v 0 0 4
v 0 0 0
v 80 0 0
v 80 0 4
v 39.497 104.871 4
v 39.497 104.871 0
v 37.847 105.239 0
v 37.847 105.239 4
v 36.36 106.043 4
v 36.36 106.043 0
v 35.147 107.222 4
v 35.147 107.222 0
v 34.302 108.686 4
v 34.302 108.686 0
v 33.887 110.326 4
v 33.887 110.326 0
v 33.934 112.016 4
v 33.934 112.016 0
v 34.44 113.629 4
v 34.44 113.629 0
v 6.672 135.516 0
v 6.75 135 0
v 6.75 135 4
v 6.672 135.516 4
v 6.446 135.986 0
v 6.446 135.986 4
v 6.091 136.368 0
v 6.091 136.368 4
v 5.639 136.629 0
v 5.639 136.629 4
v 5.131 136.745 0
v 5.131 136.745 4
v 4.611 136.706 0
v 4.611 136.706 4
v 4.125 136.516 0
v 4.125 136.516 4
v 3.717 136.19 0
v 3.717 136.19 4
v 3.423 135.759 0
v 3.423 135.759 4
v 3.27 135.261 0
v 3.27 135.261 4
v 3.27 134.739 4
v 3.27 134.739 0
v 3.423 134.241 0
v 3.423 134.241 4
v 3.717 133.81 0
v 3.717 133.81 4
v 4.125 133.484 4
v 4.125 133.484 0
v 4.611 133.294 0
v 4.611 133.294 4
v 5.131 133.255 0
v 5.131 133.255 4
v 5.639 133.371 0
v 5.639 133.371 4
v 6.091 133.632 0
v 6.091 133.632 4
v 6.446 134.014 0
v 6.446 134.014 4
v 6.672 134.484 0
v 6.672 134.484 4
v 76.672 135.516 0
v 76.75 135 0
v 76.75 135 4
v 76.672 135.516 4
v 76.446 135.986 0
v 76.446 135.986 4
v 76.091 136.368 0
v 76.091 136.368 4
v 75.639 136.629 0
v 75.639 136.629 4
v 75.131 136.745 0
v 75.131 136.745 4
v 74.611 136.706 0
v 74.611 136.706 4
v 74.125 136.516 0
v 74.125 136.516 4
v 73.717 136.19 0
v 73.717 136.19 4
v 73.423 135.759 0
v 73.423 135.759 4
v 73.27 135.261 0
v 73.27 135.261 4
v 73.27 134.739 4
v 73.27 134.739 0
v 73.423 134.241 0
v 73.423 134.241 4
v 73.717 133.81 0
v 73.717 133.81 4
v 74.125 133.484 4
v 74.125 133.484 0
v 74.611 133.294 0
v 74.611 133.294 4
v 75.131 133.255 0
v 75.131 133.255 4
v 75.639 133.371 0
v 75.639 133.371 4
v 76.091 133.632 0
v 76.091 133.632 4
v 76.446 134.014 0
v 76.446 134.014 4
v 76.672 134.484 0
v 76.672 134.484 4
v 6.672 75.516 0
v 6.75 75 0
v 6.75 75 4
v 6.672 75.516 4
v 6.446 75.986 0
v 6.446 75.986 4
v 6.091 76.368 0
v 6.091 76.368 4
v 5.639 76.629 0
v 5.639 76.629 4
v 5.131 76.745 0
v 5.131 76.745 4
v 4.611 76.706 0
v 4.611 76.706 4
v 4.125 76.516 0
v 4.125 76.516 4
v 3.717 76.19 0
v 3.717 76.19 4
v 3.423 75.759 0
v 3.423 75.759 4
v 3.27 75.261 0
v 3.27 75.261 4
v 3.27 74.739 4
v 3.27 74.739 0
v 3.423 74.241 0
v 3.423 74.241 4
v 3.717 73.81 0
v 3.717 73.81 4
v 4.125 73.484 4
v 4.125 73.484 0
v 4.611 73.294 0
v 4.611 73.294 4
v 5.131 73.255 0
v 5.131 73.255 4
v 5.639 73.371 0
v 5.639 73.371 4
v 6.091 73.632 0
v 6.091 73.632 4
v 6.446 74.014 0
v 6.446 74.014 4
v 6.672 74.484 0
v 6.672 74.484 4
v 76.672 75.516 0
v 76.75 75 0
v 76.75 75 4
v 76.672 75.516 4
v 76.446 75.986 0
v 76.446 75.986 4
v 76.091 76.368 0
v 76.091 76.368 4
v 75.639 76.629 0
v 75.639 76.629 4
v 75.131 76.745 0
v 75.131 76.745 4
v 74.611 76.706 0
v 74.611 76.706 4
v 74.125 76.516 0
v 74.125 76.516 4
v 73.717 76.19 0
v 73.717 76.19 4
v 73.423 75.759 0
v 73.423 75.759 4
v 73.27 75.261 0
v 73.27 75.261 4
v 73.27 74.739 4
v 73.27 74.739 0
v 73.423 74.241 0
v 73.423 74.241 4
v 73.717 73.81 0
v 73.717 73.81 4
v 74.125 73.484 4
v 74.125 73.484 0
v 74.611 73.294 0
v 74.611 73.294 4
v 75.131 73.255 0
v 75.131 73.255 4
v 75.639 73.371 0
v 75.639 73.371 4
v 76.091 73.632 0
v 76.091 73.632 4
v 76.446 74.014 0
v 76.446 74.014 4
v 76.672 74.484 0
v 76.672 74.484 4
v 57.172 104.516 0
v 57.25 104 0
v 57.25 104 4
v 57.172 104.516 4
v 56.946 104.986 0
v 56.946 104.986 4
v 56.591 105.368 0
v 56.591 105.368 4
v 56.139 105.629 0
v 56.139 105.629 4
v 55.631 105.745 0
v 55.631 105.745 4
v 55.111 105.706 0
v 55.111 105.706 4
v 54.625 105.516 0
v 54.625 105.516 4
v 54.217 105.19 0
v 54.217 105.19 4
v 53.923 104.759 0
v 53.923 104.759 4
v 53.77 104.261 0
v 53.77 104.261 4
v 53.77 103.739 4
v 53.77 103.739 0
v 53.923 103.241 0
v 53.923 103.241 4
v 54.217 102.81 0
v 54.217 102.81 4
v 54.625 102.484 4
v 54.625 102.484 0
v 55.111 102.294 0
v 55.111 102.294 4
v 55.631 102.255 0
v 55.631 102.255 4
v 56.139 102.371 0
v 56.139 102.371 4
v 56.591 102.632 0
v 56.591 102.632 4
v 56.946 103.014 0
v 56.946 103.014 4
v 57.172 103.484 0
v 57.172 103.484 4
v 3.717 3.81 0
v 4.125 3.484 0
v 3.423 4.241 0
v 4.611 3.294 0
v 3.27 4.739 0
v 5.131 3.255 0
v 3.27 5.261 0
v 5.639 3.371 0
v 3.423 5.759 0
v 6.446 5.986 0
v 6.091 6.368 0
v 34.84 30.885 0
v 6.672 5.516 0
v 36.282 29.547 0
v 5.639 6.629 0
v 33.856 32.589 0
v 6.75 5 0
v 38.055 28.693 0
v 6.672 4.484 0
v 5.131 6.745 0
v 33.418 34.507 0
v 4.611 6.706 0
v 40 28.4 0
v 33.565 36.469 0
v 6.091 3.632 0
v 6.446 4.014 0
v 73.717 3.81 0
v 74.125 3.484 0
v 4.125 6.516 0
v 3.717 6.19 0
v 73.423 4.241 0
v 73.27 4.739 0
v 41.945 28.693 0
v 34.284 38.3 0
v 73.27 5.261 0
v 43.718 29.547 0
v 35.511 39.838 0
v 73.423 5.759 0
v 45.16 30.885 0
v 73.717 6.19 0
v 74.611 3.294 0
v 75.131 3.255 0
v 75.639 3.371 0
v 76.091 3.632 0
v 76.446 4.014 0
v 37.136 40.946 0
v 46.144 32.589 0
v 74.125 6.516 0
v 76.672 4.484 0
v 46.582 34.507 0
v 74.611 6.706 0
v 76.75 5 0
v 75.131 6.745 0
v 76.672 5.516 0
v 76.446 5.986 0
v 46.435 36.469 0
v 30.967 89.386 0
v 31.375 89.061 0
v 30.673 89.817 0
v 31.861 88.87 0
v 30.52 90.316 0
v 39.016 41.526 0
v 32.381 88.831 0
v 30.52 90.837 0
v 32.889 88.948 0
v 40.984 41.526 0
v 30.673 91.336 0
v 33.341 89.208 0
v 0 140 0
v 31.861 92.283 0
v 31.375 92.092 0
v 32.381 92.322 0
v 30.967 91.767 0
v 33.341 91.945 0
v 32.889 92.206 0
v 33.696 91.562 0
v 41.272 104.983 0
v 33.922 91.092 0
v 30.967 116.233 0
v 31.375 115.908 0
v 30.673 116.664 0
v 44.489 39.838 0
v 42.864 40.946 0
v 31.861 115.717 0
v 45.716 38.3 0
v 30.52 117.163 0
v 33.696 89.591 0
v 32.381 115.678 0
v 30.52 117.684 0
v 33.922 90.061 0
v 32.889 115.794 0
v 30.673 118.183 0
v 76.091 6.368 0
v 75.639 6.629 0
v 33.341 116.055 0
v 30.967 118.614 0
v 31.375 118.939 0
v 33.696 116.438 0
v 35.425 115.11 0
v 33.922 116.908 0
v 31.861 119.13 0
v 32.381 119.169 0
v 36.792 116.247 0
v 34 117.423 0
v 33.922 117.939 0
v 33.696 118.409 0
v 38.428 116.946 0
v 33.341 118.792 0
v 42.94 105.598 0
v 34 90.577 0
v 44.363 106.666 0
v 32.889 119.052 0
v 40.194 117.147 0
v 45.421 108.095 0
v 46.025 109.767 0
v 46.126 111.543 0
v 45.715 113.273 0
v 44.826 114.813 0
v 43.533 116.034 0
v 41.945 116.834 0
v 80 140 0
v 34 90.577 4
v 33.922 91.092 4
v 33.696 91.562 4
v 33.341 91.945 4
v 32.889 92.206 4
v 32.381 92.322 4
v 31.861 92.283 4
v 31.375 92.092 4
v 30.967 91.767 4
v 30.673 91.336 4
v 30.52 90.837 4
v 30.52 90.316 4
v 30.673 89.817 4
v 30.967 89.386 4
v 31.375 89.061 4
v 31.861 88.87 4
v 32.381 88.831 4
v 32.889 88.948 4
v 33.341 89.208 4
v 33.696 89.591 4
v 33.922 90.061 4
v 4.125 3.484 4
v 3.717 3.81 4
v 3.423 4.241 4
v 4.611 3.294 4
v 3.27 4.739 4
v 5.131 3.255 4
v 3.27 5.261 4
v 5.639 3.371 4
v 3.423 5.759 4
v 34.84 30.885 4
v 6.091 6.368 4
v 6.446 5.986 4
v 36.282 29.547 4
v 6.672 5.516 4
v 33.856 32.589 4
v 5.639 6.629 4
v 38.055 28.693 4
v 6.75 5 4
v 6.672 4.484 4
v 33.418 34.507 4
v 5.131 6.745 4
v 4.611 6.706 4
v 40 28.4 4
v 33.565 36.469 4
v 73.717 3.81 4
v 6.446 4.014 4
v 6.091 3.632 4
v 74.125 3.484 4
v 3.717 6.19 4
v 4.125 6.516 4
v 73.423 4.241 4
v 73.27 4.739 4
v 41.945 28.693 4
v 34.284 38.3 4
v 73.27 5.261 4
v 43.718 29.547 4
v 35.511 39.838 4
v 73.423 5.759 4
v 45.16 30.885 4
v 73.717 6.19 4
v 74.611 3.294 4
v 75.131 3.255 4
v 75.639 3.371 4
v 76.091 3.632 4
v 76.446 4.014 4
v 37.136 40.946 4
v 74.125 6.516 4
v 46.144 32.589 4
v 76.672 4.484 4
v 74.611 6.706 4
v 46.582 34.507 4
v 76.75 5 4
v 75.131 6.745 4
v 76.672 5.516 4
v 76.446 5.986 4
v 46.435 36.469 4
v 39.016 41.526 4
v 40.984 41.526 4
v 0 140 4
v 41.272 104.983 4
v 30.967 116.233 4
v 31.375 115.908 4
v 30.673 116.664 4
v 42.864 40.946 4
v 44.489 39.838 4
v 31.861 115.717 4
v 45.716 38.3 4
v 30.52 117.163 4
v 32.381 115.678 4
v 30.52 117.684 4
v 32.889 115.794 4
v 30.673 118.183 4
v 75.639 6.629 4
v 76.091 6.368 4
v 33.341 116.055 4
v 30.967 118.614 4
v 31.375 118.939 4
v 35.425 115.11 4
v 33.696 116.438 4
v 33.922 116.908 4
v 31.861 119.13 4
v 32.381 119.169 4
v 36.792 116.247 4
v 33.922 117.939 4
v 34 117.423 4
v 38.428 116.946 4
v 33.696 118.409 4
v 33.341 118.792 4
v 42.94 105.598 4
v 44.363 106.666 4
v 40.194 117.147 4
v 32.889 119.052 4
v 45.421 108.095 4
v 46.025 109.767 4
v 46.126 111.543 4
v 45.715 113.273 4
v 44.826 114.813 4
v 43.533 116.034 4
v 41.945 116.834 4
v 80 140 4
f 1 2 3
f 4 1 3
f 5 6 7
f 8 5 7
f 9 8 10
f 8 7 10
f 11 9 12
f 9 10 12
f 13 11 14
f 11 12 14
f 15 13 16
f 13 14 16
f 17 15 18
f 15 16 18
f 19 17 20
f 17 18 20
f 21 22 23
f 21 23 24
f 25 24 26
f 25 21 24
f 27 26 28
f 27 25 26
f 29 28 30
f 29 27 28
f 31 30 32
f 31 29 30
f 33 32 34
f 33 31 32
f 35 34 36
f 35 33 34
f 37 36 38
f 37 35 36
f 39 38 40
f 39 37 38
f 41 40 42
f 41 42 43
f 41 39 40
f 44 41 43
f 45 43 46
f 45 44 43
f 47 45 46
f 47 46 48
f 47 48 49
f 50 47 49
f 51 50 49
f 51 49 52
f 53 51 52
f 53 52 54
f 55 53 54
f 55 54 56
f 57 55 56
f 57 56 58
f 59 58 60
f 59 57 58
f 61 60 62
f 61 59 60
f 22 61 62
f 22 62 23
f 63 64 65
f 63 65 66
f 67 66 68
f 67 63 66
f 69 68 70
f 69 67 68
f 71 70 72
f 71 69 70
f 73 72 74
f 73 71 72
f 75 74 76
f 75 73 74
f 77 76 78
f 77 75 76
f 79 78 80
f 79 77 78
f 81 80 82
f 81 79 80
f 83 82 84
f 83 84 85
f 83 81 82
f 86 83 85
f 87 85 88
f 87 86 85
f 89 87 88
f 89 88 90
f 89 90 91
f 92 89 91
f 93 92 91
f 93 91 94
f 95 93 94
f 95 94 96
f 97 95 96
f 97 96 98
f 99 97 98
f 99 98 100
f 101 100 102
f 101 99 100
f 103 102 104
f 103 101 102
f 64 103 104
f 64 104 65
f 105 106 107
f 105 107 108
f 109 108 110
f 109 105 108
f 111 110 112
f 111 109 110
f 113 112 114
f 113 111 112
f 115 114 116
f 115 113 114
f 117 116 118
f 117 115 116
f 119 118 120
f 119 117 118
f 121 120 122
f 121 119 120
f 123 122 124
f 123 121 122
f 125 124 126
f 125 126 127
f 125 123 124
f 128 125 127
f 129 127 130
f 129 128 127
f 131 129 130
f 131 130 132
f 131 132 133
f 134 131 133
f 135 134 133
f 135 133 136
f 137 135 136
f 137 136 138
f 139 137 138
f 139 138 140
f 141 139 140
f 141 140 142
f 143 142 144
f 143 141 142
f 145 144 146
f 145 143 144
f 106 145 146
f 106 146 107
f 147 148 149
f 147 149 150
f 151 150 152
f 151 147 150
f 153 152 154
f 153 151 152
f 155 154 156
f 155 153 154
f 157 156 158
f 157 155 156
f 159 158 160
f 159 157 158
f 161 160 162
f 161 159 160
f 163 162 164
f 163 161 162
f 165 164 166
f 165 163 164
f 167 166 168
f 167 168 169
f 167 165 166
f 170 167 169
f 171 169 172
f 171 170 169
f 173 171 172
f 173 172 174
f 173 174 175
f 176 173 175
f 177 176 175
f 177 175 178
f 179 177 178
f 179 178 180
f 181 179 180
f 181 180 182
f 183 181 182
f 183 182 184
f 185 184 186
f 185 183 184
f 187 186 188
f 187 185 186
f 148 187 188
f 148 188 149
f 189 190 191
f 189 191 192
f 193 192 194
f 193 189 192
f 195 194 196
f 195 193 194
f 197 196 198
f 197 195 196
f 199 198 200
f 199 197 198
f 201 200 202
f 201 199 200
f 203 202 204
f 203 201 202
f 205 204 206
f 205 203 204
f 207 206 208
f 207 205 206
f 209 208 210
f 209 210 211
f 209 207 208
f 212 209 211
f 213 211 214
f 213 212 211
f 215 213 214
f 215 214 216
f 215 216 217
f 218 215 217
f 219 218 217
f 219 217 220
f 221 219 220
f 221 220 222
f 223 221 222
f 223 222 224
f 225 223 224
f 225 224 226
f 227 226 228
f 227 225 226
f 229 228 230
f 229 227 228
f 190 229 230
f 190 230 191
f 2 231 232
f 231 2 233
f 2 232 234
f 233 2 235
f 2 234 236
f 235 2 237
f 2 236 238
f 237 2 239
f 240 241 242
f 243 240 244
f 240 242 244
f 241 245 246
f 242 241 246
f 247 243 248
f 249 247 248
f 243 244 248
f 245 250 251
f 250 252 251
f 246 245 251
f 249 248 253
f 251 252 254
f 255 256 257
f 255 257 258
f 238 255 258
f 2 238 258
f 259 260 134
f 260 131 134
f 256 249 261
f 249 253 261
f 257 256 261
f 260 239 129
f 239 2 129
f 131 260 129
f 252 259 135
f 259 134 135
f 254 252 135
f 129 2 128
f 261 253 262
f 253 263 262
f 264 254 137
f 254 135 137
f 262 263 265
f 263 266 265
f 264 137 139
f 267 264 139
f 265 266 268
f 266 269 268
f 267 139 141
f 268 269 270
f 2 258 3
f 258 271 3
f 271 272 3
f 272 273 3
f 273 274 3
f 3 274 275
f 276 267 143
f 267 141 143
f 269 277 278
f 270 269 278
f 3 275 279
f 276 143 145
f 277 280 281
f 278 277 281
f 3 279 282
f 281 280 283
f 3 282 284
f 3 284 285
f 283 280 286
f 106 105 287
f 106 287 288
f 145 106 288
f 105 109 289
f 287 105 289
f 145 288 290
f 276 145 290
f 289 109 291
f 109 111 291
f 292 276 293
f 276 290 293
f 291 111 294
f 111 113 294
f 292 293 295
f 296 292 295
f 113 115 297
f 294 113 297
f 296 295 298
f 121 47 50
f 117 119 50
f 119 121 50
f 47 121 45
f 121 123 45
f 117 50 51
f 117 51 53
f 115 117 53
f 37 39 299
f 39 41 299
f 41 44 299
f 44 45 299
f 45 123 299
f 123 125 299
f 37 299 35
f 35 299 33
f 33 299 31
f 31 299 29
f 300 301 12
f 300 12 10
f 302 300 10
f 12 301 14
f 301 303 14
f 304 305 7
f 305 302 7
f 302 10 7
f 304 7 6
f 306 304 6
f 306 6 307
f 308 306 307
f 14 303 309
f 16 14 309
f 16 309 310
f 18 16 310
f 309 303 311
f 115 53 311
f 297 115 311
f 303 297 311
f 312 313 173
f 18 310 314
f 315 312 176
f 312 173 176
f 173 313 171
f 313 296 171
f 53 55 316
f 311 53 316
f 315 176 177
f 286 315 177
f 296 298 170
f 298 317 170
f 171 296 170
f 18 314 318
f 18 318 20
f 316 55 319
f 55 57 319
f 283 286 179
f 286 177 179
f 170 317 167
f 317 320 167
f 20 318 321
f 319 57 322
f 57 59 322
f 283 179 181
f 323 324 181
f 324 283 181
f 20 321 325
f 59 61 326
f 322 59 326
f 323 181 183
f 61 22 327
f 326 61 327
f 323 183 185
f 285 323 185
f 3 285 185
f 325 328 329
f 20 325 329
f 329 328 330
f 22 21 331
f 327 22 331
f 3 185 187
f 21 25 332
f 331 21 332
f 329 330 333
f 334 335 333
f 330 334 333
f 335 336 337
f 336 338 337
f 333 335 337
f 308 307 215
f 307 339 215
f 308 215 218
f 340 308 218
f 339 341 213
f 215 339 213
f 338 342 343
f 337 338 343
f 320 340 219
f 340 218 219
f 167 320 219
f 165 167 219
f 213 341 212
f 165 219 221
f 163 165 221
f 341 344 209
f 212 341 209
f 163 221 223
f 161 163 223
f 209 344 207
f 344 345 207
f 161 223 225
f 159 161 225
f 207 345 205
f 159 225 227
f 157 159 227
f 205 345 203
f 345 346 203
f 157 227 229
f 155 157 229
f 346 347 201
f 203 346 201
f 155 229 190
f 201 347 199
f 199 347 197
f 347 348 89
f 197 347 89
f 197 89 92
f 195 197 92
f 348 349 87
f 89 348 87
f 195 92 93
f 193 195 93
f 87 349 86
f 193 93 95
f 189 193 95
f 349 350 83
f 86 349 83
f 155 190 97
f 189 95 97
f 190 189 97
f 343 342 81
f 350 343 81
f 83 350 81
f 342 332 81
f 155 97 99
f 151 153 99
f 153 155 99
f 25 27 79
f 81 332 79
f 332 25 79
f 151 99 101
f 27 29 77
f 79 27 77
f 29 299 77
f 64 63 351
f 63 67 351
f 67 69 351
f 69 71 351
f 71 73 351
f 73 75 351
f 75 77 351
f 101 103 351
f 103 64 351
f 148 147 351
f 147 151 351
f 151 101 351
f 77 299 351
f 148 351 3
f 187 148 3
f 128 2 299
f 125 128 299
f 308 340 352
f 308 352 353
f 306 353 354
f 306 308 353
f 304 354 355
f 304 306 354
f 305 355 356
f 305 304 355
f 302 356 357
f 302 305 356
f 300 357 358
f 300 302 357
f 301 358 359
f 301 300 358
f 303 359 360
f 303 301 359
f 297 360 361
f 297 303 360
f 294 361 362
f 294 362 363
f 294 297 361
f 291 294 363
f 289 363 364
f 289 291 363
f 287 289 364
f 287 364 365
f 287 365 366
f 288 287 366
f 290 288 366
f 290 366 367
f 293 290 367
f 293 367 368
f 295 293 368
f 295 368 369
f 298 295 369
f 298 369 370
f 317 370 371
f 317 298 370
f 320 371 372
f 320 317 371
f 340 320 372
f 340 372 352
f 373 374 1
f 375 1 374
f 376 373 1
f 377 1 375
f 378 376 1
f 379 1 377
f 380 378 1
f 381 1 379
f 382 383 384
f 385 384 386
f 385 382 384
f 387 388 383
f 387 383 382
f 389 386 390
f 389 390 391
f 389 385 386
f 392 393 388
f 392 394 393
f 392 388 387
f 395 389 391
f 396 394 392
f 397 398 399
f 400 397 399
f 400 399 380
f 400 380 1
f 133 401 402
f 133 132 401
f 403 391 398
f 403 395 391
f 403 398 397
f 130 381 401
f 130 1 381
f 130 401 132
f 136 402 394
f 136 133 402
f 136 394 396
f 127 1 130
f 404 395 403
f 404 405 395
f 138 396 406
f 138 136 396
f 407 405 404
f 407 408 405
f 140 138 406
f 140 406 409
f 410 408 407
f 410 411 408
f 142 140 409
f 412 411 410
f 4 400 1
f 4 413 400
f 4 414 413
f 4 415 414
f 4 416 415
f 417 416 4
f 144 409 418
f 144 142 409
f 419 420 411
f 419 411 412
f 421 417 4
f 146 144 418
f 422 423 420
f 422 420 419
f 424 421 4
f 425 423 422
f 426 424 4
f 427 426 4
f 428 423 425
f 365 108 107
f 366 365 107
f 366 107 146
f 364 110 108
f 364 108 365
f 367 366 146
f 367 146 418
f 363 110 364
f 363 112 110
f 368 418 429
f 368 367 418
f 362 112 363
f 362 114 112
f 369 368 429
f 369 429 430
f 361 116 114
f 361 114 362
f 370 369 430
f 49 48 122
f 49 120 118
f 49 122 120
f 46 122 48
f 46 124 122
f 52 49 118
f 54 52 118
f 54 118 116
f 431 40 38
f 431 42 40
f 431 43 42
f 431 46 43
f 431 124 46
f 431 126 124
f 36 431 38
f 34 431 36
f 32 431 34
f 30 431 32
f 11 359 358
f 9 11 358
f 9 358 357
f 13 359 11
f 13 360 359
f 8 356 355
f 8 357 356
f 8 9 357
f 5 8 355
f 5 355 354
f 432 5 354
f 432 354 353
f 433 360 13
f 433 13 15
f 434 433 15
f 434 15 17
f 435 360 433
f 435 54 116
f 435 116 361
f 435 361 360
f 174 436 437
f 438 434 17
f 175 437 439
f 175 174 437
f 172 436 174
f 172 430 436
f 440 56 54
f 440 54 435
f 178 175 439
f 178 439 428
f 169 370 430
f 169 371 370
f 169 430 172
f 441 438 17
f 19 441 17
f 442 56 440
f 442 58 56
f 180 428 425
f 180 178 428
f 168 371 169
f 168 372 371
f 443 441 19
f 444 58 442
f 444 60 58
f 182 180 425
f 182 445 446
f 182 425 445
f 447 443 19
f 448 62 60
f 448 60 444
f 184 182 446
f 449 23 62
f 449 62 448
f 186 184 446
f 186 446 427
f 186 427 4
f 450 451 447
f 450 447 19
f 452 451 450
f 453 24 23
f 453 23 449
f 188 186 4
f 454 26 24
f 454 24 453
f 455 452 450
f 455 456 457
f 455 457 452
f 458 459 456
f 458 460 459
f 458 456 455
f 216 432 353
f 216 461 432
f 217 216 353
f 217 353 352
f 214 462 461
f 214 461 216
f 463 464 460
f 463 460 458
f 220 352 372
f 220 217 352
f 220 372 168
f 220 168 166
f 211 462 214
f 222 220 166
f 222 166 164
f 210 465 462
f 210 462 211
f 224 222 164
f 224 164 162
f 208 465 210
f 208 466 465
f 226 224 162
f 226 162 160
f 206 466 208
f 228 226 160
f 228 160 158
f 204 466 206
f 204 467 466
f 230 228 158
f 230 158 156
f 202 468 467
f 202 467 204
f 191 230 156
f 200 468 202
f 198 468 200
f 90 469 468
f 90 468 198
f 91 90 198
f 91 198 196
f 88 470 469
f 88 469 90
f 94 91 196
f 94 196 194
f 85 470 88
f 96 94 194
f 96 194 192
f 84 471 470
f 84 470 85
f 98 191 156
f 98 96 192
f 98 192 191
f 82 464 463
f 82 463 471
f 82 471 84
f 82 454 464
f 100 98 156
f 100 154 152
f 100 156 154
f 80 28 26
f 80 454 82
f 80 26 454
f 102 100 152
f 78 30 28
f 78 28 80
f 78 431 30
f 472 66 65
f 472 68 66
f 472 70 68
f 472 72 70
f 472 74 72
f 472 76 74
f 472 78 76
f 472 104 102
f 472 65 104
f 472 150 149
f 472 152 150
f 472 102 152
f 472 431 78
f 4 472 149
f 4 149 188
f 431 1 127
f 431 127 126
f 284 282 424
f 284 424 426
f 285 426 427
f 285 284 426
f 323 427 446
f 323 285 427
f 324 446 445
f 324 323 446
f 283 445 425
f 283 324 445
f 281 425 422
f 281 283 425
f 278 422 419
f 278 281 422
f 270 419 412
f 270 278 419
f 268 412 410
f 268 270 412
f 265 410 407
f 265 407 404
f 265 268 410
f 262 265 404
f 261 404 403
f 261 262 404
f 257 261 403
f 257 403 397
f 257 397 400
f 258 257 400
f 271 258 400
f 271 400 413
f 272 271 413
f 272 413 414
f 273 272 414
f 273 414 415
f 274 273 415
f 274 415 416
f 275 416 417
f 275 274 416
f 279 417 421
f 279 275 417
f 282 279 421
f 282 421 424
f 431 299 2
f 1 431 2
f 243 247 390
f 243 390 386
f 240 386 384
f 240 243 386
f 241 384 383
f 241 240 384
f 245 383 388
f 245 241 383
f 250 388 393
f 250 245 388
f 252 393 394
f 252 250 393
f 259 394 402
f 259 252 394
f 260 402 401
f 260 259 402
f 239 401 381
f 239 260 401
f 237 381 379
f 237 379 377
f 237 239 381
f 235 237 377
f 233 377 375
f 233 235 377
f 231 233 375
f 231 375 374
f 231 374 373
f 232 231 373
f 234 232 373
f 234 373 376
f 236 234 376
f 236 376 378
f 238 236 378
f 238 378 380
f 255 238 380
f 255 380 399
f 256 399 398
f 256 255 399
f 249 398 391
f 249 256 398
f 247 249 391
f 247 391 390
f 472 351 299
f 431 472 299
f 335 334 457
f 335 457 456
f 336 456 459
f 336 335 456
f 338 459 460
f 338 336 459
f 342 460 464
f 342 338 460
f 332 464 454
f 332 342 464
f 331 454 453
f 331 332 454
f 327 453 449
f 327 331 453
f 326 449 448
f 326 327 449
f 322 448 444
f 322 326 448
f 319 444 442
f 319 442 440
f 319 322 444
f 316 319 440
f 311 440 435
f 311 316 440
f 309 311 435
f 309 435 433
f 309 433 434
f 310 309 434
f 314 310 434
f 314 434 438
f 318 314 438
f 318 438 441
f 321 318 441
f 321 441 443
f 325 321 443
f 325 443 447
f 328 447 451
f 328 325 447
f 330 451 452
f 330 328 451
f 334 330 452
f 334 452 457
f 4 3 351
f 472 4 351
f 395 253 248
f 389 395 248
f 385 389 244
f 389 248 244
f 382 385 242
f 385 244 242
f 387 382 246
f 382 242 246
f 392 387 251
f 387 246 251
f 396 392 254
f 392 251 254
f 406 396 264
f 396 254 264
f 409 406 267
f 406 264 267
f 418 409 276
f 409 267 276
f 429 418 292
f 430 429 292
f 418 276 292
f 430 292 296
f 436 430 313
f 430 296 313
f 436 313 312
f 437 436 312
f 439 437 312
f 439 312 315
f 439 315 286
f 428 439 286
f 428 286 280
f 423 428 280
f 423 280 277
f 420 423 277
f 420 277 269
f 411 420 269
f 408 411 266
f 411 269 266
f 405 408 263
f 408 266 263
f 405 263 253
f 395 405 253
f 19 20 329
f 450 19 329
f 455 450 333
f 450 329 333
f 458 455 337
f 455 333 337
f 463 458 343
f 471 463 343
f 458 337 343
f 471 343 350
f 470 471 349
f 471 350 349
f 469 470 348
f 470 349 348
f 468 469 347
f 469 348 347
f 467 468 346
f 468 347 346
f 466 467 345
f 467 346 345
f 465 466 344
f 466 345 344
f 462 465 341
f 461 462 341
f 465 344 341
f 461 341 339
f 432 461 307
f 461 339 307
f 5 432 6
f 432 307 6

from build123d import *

# Parameters (mm, degrees)
SKETCH_1_R      = 1.75
EXTRUDE_1_DEPTH = 4


with BuildPart() as part:
    # ｽｹｯﾁ1 → ﾎﾞｽ - 押し出し1 (new body)
    with BuildSketch(Plane.XY):
        Polygon((0, 0), (40, 0), (80, 0), (80, 140), (0, 140), align=None)
        with Locations((5, 135)):
            Circle(SKETCH_1_R, mode=Mode.SUBTRACT)
        with Locations((5, 5)):
            Circle(SKETCH_1_R, mode=Mode.SUBTRACT)
        with BuildLine():
            ThreePointArc((40, 41.6), (46.6, 35), (40, 28.4))
            ThreePointArc((40, 28.4), (33.4, 35), (40, 41.6))
        make_face(mode=Mode.SUBTRACT)
        with Locations((75, 5)):
            Circle(SKETCH_1_R, mode=Mode.SUBTRACT)
        with Locations((5, 75)):
            Circle(SKETCH_1_R, mode=Mode.SUBTRACT)
        with Locations((32.25, 90.576606241)):
            Circle(SKETCH_1_R, mode=Mode.SUBTRACT)
        with Locations((32.25, 117.423393759)):
            Circle(SKETCH_1_R, mode=Mode.SUBTRACT)
        with Locations((75, 75)):
            Circle(SKETCH_1_R, mode=Mode.SUBTRACT)
        with BuildLine():
            ThreePointArc((34.440448115, 113.629426332), (45.326056233, 114.075), (39.497374059, 104.870573668))
            ThreePointArc((39.497374059, 104.870573668), (34.673943767, 107.925), (34.440448115, 113.629426332))
        make_face(mode=Mode.SUBTRACT)
        with Locations((55.5, 104)):
            Circle(SKETCH_1_R, mode=Mode.SUBTRACT)
        with Locations((75, 135)):
            Circle(SKETCH_1_R, mode=Mode.SUBTRACT)
    extrude(amount=EXTRUDE_1_DEPTH)


solid = part.part
